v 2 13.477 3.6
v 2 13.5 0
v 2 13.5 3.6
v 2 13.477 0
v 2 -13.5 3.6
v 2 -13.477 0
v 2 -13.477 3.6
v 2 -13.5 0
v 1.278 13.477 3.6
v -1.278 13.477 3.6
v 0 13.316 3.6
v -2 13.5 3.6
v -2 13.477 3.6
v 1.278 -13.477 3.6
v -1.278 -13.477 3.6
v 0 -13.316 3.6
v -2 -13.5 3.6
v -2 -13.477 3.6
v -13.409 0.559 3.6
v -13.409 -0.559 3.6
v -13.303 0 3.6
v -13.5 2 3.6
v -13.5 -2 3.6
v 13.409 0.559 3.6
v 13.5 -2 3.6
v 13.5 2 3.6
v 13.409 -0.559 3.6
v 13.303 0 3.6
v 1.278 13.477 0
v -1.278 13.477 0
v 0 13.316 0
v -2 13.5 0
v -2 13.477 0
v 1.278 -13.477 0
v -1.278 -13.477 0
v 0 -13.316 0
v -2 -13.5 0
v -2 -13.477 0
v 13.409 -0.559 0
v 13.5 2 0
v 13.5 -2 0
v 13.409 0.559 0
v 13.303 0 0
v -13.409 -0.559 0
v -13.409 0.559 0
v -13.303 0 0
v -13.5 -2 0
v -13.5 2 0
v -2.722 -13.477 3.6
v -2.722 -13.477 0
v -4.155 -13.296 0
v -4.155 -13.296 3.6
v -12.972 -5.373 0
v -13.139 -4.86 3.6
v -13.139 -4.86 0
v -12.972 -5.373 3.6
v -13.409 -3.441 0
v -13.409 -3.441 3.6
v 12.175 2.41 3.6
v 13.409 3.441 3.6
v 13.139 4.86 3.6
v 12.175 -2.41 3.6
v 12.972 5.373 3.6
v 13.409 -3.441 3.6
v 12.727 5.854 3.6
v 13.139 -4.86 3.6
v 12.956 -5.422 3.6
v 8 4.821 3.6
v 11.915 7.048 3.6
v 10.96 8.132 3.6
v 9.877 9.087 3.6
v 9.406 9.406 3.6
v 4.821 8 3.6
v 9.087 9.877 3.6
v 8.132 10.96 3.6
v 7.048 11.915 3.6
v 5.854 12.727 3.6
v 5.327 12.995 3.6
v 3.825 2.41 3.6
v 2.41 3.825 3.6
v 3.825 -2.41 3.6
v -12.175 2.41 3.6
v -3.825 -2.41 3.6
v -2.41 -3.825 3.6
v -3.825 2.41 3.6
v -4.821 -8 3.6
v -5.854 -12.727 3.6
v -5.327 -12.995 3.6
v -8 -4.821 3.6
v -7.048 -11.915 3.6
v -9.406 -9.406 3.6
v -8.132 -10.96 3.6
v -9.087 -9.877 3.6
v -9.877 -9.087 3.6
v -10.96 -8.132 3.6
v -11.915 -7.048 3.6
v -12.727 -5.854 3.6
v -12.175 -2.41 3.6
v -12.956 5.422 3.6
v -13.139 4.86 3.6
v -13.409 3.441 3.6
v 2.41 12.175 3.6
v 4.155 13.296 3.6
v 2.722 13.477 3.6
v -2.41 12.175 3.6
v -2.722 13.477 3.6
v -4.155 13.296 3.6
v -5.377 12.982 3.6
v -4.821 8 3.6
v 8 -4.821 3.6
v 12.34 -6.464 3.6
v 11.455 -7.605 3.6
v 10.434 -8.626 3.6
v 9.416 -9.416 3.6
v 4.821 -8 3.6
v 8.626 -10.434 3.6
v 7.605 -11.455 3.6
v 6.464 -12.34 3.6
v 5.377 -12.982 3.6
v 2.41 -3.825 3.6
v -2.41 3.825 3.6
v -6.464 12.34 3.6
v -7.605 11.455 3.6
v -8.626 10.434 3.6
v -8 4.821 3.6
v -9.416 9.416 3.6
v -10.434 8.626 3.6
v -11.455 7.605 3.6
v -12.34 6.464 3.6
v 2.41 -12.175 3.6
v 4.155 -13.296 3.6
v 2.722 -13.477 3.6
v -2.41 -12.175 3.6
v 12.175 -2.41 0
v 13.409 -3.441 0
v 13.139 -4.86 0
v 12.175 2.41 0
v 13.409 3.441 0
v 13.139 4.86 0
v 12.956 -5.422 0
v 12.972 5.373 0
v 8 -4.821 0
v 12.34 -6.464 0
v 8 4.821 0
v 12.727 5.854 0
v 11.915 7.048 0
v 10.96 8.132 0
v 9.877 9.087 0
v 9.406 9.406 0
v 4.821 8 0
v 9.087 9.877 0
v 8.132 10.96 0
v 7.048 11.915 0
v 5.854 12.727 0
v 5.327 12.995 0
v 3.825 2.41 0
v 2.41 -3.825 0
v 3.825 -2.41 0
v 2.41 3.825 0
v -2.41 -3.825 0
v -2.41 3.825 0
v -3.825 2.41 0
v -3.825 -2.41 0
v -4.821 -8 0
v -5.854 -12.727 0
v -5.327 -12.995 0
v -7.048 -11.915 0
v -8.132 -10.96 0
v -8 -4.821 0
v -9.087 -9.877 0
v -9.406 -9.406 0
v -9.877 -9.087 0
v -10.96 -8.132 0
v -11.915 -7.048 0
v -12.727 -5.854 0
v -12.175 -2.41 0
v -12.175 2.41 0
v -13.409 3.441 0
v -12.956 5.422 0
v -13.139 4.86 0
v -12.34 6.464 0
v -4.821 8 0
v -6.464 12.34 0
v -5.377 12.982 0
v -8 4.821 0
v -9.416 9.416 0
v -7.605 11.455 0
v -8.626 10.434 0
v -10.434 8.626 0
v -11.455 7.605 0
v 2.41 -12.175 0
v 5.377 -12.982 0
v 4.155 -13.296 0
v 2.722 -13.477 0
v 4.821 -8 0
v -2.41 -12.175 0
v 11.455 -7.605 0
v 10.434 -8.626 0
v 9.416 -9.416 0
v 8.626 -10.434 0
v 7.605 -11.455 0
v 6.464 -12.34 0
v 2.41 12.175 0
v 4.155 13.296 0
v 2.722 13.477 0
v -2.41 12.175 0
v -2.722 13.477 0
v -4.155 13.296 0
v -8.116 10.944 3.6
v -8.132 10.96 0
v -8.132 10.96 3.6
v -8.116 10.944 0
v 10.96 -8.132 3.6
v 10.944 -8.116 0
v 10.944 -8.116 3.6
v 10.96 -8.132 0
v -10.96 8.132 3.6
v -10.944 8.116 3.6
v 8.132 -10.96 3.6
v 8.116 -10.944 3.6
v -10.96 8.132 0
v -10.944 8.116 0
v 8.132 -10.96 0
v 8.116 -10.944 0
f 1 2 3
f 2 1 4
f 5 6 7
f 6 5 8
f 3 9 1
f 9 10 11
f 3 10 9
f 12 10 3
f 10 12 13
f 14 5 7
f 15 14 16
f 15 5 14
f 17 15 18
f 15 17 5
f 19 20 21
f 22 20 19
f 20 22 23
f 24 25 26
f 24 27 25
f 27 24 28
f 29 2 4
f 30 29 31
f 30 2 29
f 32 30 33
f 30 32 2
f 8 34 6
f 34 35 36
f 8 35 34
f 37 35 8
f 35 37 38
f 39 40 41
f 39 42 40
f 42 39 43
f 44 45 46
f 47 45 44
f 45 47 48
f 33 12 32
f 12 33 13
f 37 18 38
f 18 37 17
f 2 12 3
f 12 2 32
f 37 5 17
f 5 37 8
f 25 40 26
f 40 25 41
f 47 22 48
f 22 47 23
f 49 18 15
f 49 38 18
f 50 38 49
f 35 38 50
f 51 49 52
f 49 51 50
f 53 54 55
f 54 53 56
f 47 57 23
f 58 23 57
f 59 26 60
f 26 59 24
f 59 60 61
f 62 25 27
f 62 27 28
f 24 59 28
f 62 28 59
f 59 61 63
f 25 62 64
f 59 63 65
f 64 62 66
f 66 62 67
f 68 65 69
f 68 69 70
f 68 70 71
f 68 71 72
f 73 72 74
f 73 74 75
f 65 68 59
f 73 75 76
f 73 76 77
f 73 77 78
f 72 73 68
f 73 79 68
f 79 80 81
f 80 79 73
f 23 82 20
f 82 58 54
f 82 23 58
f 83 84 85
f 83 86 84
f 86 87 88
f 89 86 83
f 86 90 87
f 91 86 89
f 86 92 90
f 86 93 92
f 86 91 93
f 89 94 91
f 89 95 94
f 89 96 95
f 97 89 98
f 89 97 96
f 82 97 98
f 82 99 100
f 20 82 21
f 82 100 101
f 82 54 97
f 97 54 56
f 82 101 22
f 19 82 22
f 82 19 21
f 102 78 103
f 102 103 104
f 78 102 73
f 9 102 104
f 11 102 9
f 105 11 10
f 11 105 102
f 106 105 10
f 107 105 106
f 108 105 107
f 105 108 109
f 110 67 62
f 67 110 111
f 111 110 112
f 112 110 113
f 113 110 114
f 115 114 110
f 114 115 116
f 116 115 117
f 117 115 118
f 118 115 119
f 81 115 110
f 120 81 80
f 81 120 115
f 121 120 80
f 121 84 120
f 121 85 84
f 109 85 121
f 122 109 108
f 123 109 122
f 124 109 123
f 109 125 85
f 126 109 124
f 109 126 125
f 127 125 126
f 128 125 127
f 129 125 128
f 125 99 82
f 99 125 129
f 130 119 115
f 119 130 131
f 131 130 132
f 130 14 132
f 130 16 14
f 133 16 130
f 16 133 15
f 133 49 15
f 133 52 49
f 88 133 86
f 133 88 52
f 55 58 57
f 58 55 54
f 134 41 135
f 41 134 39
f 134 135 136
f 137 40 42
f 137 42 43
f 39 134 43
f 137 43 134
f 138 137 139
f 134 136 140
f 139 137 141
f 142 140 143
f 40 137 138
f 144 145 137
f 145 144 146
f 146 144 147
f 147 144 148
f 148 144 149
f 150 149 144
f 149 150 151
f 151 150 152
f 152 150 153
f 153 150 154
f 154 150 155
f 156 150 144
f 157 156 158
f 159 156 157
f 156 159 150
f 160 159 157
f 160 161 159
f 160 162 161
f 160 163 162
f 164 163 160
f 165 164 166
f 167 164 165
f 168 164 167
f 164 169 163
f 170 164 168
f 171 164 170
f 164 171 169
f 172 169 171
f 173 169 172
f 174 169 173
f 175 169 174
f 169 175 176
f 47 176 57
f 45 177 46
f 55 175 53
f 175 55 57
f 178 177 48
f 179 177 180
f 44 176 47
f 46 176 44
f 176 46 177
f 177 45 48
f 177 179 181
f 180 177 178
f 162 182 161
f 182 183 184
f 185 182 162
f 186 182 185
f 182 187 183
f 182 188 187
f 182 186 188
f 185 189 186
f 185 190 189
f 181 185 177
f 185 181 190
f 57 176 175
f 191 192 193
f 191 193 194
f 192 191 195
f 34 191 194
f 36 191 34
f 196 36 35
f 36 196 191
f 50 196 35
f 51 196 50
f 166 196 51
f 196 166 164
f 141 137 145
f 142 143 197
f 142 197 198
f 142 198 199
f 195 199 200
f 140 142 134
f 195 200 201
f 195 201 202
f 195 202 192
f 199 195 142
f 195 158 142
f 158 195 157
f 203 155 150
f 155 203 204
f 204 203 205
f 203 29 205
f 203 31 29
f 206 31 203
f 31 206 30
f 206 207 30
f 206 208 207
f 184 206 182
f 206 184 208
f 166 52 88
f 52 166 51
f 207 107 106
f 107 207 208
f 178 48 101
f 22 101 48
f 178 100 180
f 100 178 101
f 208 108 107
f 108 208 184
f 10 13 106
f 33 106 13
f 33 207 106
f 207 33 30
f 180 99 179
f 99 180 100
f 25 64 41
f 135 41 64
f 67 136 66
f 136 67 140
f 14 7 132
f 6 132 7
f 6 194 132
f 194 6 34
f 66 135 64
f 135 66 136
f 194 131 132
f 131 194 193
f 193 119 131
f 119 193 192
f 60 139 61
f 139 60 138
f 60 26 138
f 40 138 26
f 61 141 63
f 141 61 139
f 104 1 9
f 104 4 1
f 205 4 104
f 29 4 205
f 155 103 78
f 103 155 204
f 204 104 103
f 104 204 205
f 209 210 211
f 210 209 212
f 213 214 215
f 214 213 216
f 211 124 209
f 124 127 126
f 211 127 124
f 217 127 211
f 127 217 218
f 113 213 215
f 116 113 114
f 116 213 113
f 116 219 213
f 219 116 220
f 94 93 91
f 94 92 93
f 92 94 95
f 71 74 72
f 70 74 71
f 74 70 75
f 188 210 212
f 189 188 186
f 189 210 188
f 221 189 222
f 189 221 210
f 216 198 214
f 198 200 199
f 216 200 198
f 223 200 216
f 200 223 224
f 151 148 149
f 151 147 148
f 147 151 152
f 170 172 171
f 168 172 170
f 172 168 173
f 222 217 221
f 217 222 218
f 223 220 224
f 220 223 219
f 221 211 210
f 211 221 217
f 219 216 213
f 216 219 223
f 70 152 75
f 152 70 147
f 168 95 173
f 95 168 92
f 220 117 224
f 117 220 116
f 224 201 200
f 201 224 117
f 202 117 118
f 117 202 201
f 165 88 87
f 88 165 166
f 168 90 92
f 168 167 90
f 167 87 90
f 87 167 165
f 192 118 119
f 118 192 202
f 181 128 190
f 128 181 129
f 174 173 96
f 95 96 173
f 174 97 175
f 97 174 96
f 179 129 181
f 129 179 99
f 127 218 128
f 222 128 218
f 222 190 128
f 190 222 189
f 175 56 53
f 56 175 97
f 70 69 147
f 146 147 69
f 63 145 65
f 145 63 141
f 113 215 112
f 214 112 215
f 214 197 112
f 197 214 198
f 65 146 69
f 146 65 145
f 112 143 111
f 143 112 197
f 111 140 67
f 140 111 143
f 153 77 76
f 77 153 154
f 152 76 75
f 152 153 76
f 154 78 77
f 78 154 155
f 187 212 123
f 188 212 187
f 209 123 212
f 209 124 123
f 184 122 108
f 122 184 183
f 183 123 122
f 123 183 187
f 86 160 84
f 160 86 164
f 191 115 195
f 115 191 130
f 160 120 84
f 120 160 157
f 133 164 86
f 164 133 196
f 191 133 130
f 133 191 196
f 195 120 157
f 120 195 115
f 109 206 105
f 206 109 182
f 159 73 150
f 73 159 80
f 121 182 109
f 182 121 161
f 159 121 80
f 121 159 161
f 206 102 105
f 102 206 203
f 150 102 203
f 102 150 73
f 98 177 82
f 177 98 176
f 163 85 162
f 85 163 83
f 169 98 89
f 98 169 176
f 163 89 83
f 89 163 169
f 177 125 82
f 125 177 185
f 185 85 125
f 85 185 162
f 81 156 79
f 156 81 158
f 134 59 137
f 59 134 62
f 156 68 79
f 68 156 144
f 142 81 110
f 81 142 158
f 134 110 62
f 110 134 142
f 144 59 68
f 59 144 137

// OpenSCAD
$fn=50;

// slot - A rounded slot framed by two cylinders of diameter w a distance l apart.
//  It is assumed that this is mostly used for subtraction. 
//  The drop makes it extend below the xy plane for robust subtraction.
module slot(l, w, h, drop)
{
    translate([l/2,0,-drop])
        cylinder(r=w/2,h=h+drop);
    translate([-l/2,0,-drop])
        cylinder(r=w/2,h=h+drop);
    translate([0,0,(h-drop)/2])
        cube([l, w, h+drop], center=true);
}

module hole(r, h, drop)
{
    translate([0,0,-drop])
    cylinder(r=r,h=h+drop);
}

// hexagon - A 2D hexagon with flat to flat diameter w. Flats are parallel to x axis.
module hexagon(w)
{
    s = w/sqrt(3);
    polygon([[-s/2,w/2],[s/2,w/2],[s,0],[s/2,-w/2],[-s/2,-w/2],[-s,0]]);
}

// hexagonalPrism - An extrusion of the hexagon. Has an optional drop below the xy plane.
module hexagonalPrism(w, h, drop)
{
    translate([0,0,-drop])
    linear_extrude(height=h+drop)
    hexagon(w);
}

// roundRect - Actually a rounded rectangular prism. Makes a cube of dimension x,y,z, but
//   centered on the z axis and sitting on the xy plane. Vertical corners are rounded
//   with radius r. Allows an optional drop below the xy plane.
module roundRect(x, y, z, r, drop)
{
    union()
    {
        translate([0,0,(z-drop)/2])
        {
            cube([x-2*r,y,z+drop],center=true);
            cube([x,y-2*r,z+drop],center=true);
        }
        translate([-(x/2-r),-(y/2-r),-drop])
            cylinder(r=r,h=z+drop);
        translate([-(x/2-r),(y/2-r),-drop])
            cylinder(r=r,h=z+drop);
        translate([(x/2-r),-(y/2-r),-drop])
            cylinder(r=r,h=z+drop);
        translate([(x/2-r),(y/2-r),-drop])
            cylinder(r=r,h=z+drop);
    }
}

smallR = 4.2/2; // Nominal 3.7 mm.  4.2 works on TAZ. For #6-32 holes
screwHeadDiameter = 6.5;  // Nominal 6.0 mm.
screwHeadHeight = 4.0;
lockNutHexFlat = 7.94 + 0.41;  // Flat to flat diameter for 5/16" nut = 7.94 mm.
                        // On Prusa this came out as a 7.5 opening.
lockNutHeight = 4.6;                 

module nutHolder(h, b, d) // height, backing, drop
{
    if (b != 0)
    {
        translate([0,0,b])
            hexagonalPrism(lockNutHexFlat, h, 0);
        hole(smallR, height, d);
    }
    else
    {
        hexagonalPrism(lockNutHexFlat, h+d, d);
    }
}

// The model


length = 78.0;
width = 27;  // Nominal is 27.0
backing = 0.0;  // Was 2.0
height = lockNutHeight + backing - 1.0;
holeSeparationX = 64.0;
holeSeparationY = 16.0;

difference()
{
    intersection()
    {
        roundRect(width, width, height, width/2-2, 0);
        rotate([0,0,45])
        roundRect(width, width, height, width/2-2, 0);
    }
    
    union()
    {
        translate([0,-holeSeparationY/2,0])
            nutHolder(height, backing, 0.1);
        translate([0,holeSeparationY/2,0])
            nutHolder(height, backing, 0.1);
        translate([-holeSeparationY/2,0,0])
            rotate([0,0,30])
            nutHolder(height, backing, 0.1);
        translate([holeSeparationY/2,0,0])
            rotate([0,0,30])
            nutHolder(height, backing, 0.1);
        
        
    }
    
}
